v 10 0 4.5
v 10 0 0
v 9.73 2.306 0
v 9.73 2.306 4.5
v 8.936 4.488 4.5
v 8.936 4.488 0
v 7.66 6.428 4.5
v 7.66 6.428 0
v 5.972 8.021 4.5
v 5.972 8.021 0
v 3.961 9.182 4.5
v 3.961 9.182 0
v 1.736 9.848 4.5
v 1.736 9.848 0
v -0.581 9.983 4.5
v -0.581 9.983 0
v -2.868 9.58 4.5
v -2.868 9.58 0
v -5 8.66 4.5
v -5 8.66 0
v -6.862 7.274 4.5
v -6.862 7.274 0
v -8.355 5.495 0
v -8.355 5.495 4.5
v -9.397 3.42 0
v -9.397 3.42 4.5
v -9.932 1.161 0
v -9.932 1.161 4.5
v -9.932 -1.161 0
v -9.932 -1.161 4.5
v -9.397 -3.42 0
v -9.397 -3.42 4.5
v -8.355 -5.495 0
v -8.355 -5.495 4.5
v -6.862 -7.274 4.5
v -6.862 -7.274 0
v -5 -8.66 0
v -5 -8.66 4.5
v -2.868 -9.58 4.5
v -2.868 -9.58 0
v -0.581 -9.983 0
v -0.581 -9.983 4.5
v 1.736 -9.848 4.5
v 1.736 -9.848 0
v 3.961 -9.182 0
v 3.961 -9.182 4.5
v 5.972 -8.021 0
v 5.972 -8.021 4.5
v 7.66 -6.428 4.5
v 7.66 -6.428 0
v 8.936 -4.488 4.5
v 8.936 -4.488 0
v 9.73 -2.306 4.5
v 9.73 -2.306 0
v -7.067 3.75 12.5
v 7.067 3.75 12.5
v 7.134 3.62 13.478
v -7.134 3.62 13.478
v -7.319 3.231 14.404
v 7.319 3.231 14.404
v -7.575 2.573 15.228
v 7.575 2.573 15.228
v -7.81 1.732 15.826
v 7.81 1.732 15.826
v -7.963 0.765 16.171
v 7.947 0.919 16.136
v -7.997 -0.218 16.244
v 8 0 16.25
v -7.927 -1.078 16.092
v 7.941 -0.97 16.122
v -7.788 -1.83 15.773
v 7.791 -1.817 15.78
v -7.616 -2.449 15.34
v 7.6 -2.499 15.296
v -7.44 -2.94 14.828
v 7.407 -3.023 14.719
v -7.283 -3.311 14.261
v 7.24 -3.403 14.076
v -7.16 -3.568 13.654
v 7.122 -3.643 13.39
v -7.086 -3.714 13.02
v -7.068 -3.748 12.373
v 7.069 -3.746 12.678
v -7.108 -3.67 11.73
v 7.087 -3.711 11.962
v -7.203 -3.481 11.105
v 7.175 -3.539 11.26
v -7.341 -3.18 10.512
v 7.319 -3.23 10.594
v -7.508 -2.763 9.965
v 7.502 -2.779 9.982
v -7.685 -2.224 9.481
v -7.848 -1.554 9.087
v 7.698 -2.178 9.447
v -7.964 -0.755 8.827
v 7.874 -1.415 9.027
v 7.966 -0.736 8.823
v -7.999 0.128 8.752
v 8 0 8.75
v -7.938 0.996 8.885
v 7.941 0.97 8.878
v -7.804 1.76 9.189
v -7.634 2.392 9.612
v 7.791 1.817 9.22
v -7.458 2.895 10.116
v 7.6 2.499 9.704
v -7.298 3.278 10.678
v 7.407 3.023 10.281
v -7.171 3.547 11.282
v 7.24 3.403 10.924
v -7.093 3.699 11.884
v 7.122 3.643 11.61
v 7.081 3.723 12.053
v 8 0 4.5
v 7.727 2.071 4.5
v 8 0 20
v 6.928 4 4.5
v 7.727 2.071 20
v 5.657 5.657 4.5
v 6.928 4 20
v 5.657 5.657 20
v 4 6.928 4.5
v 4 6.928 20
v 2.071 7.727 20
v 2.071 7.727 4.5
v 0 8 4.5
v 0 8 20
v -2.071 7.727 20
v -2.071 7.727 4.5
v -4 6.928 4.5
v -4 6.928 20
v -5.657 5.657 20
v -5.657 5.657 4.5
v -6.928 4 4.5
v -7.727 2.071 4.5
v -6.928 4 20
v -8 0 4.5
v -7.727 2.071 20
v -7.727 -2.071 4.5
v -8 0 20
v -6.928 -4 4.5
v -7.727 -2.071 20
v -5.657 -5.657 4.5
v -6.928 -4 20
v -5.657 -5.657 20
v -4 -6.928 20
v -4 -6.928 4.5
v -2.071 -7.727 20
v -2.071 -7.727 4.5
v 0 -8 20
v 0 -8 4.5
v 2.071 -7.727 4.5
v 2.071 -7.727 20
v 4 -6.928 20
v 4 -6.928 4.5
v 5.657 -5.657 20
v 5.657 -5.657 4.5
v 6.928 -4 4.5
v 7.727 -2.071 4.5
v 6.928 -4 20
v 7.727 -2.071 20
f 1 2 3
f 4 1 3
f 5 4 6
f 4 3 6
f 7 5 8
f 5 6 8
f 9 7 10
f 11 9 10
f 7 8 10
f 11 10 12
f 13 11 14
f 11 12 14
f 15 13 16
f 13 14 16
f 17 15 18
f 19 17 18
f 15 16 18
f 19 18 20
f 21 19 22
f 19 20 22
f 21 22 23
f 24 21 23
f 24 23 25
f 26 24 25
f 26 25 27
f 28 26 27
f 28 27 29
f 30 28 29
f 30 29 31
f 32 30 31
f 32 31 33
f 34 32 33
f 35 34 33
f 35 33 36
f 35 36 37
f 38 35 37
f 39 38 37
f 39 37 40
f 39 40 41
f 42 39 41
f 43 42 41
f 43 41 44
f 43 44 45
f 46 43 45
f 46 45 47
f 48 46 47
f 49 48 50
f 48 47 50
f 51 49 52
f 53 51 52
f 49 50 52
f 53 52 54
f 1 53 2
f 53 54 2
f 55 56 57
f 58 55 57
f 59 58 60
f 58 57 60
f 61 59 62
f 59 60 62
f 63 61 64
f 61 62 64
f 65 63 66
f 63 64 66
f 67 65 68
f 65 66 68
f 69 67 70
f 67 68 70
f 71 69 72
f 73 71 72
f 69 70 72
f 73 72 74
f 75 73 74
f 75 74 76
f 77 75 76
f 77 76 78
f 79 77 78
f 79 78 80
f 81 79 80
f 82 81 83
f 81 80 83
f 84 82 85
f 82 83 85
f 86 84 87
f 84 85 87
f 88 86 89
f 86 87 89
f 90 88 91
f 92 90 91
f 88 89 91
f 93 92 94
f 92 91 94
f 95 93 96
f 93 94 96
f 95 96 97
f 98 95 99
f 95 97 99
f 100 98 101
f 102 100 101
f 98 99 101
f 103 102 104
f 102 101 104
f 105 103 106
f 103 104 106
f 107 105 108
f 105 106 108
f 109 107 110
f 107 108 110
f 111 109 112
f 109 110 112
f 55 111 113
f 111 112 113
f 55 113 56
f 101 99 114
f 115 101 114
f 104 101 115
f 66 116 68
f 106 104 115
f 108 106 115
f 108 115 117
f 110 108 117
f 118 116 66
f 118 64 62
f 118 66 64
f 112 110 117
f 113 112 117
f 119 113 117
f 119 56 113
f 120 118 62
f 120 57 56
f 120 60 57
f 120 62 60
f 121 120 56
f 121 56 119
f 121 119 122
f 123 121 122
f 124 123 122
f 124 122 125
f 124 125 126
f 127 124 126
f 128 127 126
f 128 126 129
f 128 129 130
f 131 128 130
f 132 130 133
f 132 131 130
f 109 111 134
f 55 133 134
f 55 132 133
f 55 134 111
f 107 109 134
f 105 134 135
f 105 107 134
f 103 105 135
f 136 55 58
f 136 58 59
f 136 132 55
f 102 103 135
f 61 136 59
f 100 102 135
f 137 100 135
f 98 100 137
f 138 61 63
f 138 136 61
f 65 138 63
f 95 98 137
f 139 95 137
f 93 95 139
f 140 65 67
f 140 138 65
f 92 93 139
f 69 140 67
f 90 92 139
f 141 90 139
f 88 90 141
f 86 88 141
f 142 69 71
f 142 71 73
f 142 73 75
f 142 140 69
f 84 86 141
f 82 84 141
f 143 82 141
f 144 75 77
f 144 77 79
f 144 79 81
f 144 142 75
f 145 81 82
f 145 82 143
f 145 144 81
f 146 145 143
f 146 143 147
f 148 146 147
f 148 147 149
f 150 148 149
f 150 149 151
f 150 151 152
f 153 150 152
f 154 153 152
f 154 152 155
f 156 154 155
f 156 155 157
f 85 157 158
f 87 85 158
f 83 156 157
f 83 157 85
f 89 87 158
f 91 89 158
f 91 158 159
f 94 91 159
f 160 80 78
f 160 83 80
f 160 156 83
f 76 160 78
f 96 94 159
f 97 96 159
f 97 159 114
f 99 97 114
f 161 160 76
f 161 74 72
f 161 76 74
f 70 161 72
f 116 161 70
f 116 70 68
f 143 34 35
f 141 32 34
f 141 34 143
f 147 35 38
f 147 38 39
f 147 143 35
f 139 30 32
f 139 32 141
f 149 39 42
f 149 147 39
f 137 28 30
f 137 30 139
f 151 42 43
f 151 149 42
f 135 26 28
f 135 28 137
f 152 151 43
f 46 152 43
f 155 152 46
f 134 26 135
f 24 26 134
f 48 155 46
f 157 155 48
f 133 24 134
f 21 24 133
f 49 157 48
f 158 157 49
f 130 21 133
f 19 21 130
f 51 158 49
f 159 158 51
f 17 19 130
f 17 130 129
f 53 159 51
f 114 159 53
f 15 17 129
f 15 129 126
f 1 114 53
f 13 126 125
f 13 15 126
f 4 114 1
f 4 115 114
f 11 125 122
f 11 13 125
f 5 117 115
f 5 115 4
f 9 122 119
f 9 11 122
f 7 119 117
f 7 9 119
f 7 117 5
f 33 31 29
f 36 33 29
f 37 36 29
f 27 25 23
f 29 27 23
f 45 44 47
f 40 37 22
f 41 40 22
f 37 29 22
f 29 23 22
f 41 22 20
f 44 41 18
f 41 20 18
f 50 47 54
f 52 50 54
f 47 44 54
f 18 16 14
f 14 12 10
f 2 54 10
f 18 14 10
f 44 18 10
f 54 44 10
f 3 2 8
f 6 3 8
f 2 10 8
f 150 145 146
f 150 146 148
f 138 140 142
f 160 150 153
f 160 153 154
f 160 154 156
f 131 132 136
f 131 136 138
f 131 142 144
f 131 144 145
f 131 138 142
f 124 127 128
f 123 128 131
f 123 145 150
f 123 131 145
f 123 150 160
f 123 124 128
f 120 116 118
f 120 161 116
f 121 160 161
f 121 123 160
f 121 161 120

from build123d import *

# Parameters (mm, degrees)
F0_R     = 10
F1_DEPTH = 20
F2_R     = 10
F2_R_2   = 8
F3_DEPTH = 15.5
F5_R     = 3.75
F6_DEPTH = 25


with BuildPart() as f1:
    # F0 (on Top) → F1 (new body)
    with BuildSketch(Plane.XY):
        Circle(F0_R)
    extrude(amount=F1_DEPTH)

    # F2 (on face) → F3 (cut)
    with BuildSketch(Plane.XY.offset(20)):
        Circle(F2_R)
        Circle(F2_R_2, mode=Mode.SUBTRACT)
    extrude(amount=-F3_DEPTH, mode=Mode.SUBTRACT)

    # F5 (on offset) → F6 (cut)
    with BuildSketch(Plane.YZ.offset(10)):
        with Locations((0, 12.5)):
            Circle(F5_R)
    extrude(amount=-F6_DEPTH, mode=Mode.SUBTRACT)


solid = f1.part
